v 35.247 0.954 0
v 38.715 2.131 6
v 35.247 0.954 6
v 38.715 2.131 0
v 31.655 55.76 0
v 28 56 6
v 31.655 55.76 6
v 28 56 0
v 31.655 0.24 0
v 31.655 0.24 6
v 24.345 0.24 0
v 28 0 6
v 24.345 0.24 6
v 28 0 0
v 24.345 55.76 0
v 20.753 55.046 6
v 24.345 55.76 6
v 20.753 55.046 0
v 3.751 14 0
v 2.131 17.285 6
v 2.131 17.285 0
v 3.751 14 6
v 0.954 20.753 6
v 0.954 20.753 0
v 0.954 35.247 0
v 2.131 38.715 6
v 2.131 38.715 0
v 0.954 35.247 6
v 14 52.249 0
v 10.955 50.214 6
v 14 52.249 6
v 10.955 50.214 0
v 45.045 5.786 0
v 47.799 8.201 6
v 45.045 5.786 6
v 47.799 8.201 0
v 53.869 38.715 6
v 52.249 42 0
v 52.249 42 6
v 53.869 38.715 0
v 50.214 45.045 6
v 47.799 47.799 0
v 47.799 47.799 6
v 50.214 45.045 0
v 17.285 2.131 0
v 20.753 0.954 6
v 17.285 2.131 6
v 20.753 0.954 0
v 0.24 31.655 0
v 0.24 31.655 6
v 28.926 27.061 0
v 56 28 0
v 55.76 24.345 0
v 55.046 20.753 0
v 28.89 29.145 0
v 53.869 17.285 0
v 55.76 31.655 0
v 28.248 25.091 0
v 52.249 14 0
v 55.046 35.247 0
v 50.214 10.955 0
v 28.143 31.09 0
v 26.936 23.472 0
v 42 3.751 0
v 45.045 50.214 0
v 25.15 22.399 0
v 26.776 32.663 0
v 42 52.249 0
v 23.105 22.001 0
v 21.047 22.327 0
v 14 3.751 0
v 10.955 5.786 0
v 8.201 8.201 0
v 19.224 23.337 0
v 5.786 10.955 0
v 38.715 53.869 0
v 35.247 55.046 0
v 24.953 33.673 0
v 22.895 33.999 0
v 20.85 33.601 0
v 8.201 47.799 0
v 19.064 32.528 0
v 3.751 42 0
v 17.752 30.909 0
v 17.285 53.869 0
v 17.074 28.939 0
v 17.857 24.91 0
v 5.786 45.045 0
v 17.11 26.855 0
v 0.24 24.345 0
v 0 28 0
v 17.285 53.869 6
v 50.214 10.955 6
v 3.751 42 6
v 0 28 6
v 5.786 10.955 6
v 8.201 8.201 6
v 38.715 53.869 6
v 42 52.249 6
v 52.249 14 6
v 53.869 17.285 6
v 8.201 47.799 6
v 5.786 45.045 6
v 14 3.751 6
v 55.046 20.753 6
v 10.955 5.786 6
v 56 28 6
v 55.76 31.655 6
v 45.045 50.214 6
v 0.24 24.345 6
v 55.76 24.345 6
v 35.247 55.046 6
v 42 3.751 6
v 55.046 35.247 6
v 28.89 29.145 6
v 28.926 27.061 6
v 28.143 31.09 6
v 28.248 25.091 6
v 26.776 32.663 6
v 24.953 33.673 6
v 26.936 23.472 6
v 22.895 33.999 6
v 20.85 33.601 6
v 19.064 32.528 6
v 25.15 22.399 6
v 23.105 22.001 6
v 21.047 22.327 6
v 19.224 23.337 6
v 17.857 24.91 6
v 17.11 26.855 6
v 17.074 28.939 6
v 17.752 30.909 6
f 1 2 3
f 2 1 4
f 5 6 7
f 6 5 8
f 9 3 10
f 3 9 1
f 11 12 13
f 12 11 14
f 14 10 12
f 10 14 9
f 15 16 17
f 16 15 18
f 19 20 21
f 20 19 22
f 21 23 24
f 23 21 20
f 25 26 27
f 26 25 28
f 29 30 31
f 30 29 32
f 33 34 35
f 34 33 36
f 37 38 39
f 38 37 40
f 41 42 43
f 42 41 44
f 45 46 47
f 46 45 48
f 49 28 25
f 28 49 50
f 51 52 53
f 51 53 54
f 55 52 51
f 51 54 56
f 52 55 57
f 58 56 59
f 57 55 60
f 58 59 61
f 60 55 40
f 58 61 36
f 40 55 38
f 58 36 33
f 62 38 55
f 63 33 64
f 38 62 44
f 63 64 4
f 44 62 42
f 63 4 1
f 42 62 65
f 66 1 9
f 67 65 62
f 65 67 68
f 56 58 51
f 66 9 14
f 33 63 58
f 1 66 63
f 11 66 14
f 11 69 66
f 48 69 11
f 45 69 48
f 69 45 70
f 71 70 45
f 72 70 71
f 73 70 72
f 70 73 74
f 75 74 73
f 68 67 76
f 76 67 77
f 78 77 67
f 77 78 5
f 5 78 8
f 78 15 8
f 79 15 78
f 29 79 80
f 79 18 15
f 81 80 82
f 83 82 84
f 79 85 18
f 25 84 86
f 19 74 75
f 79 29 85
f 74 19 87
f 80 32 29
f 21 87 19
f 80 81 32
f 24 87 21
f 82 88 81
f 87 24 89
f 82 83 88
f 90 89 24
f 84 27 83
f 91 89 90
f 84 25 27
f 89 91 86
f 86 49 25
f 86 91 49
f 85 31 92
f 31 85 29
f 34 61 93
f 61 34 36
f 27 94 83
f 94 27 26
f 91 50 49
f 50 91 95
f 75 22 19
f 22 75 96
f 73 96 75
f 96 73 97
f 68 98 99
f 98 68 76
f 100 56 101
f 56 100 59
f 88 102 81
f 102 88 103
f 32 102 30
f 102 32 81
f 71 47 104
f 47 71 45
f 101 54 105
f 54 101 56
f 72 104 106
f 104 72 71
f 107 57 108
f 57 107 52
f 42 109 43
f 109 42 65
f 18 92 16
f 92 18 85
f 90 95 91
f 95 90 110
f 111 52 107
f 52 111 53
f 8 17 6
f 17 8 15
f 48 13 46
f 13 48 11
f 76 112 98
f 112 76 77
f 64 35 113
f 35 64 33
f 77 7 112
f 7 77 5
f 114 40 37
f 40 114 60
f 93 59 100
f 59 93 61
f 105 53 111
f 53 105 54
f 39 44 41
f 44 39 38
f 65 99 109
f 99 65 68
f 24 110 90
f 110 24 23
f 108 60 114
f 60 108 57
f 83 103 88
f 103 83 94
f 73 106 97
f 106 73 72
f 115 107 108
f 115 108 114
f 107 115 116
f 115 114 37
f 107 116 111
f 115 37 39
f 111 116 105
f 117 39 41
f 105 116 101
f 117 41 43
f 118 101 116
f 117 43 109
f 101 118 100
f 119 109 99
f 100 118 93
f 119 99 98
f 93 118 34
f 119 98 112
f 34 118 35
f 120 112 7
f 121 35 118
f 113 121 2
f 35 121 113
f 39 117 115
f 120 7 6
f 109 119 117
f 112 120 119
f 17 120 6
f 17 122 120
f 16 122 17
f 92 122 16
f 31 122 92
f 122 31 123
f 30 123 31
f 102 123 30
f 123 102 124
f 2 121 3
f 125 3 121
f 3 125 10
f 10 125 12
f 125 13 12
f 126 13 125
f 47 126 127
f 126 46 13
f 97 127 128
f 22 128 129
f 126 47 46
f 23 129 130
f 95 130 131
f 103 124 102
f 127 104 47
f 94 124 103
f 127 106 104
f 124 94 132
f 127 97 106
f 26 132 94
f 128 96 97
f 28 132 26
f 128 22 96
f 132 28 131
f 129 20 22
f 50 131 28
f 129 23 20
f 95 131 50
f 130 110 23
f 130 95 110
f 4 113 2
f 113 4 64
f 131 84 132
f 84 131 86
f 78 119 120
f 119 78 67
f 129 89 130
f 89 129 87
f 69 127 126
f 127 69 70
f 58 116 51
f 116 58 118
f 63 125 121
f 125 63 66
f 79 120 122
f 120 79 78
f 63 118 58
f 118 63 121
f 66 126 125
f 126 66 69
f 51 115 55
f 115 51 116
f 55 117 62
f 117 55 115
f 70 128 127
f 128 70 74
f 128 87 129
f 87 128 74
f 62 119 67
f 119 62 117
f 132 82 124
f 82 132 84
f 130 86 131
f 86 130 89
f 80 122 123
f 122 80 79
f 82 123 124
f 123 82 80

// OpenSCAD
$fn = 32;

// ----------------------------------------------------------------------
// Cam plate: eccentric cam, base R28
// ----------------------------------------------------------------------

// --- parameters (mm) ---
base_r = 28;              // base circle radius
lobe_h = 14;              // cam lobe rise
bore_r = 6;               // shaft bore radius
plate_t = 6;              // plate thickness, Z (extrusion height)
ecc = 5;                  // disc eccentricity

profile = [[56, 28], [55.76, 31.655], [55.046, 35.247], [53.869, 38.715], [52.249, 42], [50.214, 45.045], [47.799, 47.799], [45.045, 50.214], [42, 52.249], [38.715, 53.869], [35.247, 55.046], [31.655, 55.76], [28, 56], [24.345, 55.76], [20.753, 55.046], [17.285, 53.869], [14, 52.249], [10.955, 50.214], [8.201, 47.799], [5.786, 45.045], [3.751, 42], [2.131, 38.715], [0.954, 35.247], [0.24, 31.655], [0, 28], [0.24, 24.345], [0.954, 20.753], [2.131, 17.285], [3.751, 14], [5.786, 10.955], [8.201, 8.201], [10.955, 5.786], [14, 3.751], [17.285, 2.131], [20.753, 0.954], [24.345, 0.24], [28, 0], [31.655, 0.24], [35.247, 0.954], [38.715, 2.131], [42, 3.751], [45.045, 5.786], [47.799, 8.201], [50.214, 10.955], [52.249, 14], [53.869, 17.285], [55.046, 20.753], [55.76, 24.345]];  // primary outline, 48 points, counter clockwise
void_1 = [[28.89, 29.145], [28.143, 31.09], [26.776, 32.663], [24.953, 33.673], [22.895, 33.999], [20.85, 33.601], [19.064, 32.528], [17.752, 30.909], [17.074, 28.939], [17.11, 26.855], [17.857, 24.91], [19.224, 23.337], [21.047, 22.327], [23.105, 22.001], [25.15, 22.399], [26.936, 23.472], [28.248, 25.091], [28.926, 27.061]];  // shaft bore, 18 points

// --- the one profile operation ---
difference() {
  linear_extrude(height = plate_t) polygon(points = profile);
  translate([0, 0, -1])
    linear_extrude(height = plate_t + 2) polygon(points = void_1);
}
